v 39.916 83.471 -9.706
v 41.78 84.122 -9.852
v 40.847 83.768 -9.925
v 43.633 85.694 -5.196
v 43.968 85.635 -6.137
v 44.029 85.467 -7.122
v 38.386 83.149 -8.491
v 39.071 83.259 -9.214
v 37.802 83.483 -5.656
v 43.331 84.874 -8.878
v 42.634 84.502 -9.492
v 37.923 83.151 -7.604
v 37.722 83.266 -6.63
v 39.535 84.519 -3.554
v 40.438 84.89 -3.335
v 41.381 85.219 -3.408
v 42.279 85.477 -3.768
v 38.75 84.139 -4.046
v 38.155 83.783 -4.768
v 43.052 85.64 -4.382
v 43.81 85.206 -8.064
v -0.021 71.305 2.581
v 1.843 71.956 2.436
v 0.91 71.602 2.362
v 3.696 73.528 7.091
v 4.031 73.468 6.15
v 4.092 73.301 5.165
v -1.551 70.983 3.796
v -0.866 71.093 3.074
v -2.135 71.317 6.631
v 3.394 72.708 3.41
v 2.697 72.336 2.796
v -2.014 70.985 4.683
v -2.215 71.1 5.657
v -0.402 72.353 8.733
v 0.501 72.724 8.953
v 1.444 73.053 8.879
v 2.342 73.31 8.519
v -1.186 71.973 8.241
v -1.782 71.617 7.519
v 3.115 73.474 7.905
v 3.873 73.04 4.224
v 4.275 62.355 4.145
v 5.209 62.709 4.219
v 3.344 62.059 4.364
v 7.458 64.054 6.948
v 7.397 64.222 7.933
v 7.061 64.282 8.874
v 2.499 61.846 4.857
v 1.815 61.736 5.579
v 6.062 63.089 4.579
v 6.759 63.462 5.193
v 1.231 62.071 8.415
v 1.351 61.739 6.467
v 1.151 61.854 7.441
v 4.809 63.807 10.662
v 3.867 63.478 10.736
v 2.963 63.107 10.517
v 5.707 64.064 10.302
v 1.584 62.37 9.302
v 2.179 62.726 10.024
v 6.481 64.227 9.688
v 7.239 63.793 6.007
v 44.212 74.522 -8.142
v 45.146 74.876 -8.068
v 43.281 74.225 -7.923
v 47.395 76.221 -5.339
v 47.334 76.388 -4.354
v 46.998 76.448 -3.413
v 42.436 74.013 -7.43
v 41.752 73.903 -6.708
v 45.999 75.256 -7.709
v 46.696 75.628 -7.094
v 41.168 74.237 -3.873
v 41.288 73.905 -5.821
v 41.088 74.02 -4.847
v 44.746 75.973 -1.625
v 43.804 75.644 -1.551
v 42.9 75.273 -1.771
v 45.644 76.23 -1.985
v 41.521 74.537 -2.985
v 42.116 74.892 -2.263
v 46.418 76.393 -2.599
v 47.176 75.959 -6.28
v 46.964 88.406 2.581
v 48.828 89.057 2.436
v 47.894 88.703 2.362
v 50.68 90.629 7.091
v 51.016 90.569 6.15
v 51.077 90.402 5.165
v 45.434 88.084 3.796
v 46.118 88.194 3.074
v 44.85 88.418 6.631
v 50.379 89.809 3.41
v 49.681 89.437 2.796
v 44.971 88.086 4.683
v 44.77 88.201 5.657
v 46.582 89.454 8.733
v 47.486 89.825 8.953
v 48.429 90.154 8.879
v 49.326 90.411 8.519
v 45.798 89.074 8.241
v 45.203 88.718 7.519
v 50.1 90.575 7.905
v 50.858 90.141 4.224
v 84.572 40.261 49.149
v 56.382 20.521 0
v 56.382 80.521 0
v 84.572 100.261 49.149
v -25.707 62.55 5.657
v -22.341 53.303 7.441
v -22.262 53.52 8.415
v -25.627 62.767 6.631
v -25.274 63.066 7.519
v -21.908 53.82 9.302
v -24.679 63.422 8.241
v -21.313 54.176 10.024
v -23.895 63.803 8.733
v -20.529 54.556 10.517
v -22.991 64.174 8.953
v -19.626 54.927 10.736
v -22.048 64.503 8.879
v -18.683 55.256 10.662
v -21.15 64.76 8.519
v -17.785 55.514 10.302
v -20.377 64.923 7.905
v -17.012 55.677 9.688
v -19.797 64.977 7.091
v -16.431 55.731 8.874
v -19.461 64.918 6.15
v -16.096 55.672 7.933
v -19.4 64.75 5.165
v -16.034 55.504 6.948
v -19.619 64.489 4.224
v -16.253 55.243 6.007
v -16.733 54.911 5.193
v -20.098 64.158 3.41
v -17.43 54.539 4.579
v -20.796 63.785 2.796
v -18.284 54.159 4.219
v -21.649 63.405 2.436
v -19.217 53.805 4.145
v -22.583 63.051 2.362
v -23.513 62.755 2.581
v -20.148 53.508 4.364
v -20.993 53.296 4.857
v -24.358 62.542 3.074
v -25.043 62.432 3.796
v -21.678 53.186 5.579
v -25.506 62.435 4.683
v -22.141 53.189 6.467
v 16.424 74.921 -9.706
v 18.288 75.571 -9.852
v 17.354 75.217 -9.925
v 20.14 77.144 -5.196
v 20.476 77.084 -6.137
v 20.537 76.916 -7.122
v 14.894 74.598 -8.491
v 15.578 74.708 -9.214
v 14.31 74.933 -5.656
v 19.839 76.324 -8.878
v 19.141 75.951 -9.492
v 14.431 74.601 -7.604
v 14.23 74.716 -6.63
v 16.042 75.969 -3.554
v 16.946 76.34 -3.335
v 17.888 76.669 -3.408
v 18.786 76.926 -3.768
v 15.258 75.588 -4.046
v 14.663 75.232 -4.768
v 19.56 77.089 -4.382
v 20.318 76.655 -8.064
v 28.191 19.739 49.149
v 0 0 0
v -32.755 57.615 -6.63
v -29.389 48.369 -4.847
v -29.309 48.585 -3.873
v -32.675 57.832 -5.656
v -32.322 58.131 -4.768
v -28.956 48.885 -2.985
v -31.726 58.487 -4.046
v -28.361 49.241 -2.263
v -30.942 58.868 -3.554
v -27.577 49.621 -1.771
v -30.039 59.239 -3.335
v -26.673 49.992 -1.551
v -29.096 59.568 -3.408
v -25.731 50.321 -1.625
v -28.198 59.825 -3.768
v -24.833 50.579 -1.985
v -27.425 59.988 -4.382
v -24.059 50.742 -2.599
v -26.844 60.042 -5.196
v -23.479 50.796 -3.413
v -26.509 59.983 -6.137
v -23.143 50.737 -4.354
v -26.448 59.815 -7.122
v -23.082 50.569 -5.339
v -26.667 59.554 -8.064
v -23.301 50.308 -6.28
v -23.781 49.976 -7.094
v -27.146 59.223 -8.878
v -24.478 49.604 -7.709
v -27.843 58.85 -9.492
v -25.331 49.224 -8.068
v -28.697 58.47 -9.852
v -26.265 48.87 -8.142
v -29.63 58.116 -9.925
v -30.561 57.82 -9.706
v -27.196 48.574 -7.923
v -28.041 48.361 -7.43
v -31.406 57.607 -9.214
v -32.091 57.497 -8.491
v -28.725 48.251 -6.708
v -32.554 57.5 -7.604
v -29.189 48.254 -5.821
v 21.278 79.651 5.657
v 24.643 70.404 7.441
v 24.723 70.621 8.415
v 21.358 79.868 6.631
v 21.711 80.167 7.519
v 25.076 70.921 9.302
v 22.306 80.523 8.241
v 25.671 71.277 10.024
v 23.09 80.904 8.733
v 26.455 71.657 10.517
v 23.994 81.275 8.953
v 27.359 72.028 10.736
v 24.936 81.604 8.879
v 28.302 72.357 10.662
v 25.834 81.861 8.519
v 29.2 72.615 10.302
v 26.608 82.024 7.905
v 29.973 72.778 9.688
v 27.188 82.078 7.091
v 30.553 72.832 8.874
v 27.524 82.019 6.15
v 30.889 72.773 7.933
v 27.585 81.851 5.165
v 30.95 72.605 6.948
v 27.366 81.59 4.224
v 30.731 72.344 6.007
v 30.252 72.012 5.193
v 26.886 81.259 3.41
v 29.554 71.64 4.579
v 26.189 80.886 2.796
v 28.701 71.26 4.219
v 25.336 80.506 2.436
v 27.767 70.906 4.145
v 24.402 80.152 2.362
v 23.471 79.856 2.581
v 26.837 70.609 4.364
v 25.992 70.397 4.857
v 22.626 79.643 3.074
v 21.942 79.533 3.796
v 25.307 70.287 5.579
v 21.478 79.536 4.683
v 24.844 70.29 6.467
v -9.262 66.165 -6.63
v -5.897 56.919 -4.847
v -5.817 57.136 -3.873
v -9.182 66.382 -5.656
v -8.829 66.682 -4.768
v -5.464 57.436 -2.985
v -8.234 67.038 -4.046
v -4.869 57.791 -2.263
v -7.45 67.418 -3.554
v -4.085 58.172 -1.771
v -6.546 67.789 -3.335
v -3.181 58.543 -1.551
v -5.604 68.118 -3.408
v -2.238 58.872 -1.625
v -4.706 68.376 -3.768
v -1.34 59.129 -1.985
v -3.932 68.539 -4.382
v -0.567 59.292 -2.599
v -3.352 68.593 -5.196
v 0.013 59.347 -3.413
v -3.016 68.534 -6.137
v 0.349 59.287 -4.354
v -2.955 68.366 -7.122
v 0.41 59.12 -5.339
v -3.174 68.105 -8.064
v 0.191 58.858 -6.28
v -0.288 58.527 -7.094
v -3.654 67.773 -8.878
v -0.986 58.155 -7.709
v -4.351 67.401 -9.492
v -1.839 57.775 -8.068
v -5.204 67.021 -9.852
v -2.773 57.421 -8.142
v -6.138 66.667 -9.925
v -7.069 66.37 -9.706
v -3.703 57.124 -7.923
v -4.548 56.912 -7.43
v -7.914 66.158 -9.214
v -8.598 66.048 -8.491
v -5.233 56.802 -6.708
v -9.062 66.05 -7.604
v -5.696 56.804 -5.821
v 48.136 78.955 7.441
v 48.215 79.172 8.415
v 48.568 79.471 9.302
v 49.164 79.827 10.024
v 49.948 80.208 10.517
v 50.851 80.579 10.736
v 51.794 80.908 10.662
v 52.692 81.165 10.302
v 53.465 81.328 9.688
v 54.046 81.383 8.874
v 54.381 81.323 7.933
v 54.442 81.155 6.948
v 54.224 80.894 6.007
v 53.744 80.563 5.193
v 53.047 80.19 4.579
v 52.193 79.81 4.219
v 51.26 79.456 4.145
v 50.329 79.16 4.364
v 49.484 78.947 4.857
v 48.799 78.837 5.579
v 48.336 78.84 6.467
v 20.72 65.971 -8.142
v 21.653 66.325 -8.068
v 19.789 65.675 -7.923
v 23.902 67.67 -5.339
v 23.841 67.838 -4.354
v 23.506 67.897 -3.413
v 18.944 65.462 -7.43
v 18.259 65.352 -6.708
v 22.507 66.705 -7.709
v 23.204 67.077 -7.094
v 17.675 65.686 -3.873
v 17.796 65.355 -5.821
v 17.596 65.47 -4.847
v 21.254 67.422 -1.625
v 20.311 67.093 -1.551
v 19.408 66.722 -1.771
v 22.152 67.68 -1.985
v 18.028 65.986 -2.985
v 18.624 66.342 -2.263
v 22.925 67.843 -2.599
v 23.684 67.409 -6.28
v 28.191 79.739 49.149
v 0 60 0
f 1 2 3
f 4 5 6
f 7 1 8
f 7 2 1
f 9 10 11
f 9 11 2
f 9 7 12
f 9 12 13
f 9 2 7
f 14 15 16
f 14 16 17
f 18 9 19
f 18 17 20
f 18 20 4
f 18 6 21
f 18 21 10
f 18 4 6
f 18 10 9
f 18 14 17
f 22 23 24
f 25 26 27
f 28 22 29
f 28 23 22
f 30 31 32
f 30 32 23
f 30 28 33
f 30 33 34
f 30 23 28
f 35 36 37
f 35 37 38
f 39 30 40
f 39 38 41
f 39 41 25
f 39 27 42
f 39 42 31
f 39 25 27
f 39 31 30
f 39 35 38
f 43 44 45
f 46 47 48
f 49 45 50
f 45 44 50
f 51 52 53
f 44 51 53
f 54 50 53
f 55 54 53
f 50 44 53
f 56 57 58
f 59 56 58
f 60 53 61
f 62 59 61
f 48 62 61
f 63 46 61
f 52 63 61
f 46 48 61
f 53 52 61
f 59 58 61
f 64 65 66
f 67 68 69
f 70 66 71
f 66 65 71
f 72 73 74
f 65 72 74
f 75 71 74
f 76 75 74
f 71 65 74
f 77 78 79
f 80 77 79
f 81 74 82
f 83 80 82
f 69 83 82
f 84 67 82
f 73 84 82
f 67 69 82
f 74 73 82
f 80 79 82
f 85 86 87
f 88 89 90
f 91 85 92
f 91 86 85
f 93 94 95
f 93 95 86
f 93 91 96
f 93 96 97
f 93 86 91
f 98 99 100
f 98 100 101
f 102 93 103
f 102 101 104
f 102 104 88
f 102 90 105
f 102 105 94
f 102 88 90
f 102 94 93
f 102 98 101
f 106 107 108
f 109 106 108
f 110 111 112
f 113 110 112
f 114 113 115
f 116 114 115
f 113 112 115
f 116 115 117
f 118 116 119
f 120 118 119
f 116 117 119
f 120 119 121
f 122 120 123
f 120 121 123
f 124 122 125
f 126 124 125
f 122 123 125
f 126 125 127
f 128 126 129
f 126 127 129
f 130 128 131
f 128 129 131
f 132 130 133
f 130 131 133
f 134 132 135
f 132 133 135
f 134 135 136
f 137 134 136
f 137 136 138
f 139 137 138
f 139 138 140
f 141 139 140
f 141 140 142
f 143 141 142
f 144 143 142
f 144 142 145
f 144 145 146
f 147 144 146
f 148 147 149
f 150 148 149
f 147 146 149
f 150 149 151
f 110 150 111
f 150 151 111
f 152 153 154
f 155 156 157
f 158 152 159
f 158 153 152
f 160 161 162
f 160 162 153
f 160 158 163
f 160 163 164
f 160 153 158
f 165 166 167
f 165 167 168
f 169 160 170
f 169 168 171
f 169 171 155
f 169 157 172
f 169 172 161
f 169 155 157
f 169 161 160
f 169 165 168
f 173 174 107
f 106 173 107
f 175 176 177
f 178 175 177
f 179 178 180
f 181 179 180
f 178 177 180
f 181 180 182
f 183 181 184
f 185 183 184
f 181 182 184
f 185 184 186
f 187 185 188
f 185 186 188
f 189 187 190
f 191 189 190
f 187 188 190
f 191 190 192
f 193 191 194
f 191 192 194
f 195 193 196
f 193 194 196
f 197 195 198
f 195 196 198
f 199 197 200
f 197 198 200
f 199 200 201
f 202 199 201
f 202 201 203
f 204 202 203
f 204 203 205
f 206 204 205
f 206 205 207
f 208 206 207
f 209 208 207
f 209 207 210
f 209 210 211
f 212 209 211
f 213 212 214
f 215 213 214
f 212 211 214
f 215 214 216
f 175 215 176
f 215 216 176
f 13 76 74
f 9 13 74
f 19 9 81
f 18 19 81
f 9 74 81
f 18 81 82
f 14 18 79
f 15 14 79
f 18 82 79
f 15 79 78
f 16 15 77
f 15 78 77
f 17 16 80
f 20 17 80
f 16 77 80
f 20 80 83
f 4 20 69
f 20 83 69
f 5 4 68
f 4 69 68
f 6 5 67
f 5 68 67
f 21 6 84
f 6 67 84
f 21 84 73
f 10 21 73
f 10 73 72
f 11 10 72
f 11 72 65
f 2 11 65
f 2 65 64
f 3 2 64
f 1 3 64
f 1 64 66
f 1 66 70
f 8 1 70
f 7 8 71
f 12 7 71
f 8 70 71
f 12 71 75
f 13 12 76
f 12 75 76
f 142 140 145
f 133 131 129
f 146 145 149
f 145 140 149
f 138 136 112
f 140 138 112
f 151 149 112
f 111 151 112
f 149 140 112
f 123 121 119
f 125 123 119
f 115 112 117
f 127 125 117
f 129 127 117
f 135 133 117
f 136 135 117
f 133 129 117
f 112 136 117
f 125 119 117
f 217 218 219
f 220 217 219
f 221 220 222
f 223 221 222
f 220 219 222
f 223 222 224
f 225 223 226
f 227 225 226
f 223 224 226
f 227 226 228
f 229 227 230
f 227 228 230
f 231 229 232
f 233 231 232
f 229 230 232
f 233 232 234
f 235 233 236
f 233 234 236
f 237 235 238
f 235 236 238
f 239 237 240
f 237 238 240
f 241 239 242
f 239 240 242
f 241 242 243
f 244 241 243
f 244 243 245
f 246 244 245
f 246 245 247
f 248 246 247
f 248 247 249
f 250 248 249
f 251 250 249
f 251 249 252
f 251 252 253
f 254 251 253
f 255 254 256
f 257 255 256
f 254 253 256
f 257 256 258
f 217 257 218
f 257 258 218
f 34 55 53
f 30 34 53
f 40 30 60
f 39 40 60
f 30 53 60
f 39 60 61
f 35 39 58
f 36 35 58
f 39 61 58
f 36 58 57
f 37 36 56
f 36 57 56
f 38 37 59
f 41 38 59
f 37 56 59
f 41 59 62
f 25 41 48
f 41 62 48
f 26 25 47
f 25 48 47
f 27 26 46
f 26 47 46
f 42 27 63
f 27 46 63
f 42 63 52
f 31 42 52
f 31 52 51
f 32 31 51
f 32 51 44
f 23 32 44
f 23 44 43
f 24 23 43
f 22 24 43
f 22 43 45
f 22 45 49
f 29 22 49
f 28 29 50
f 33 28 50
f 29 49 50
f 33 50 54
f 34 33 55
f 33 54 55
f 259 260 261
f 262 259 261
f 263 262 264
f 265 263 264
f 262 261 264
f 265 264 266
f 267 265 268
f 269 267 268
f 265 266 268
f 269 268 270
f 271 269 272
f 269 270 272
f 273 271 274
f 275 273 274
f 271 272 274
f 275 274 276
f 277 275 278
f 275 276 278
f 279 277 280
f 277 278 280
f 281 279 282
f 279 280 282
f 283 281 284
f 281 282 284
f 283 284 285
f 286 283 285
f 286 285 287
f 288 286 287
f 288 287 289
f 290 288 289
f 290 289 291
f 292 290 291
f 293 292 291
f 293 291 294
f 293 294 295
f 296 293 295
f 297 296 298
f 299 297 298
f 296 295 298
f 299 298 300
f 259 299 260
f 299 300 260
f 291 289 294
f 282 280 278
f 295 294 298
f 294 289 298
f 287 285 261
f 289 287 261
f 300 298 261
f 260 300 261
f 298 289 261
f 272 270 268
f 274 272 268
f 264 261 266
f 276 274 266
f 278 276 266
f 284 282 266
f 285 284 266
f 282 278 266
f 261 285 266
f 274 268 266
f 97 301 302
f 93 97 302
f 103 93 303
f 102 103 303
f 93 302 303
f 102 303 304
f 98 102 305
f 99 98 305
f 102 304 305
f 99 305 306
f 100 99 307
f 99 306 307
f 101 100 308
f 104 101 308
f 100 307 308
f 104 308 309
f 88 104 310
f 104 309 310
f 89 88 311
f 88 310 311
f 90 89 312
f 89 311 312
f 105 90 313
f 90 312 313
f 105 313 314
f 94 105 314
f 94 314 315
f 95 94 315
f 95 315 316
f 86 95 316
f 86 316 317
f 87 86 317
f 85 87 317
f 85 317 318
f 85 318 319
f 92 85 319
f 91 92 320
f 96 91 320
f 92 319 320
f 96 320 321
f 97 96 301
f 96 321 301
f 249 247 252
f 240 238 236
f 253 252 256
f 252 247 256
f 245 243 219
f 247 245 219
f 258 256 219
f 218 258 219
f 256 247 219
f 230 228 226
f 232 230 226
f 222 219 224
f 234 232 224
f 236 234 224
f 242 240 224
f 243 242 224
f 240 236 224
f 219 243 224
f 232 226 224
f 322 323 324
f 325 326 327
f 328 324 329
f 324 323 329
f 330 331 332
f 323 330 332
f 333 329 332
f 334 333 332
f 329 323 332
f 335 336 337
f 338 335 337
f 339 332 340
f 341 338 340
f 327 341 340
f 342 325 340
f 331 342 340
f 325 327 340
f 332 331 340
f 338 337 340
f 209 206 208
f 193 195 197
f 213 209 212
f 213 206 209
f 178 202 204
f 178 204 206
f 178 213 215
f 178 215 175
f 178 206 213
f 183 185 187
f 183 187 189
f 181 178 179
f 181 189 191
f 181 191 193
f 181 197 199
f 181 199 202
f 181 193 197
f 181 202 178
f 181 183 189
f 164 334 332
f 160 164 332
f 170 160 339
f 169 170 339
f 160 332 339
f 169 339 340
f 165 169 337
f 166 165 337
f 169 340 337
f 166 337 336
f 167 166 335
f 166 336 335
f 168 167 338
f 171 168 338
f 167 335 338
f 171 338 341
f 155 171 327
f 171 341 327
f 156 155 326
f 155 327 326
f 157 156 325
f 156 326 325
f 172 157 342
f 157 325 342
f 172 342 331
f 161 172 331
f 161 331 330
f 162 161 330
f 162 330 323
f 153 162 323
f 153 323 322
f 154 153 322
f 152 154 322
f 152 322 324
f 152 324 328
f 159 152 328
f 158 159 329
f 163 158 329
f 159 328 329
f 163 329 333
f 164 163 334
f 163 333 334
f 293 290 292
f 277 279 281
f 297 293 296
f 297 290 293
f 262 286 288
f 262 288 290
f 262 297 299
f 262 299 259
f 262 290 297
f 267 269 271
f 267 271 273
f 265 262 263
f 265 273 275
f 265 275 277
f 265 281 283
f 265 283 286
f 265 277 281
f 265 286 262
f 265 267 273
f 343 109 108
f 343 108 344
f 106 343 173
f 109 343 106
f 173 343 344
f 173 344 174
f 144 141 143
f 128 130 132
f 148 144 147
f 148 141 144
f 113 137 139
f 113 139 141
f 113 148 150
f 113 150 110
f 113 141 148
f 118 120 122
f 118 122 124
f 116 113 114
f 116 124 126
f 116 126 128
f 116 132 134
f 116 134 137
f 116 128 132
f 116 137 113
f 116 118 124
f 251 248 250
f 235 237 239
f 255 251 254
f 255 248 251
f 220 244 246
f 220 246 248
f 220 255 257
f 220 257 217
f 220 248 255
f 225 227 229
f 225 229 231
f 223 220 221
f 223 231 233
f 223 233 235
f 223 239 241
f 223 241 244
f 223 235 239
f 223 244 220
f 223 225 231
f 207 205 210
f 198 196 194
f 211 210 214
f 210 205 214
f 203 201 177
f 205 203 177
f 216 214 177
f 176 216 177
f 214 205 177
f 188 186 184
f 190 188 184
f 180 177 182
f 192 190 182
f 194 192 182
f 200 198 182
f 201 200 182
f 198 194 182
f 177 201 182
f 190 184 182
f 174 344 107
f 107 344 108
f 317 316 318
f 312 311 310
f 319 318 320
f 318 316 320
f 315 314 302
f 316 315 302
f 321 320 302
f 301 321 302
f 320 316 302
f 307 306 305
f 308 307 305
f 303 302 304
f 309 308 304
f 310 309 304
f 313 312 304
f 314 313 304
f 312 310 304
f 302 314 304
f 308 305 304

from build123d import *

# Parameters (mm, degrees)
SKIZZE1_R                       = 3.358360703
AUFSATZ_LINEAR_AUSTRAGEN1_DEPTH = 10
LINEARES_MUSTER2_COUNT          = 4
LINEARES_MUSTER2_PITCH          = 25
LINEARES_MUSTER2_COUNT_DIR2     = 2
LINEARES_MUSTER2_PITCH_DIR2     = 15


with BuildPart() as part:
    # Austragung1: sweep along a path in SK Pfad
    with BuildLine(Plane(origin=(0, 0, 0), x_dir=(0, 0, 1), z_dir=(-0.573576436, 0.819152044, 0))) as austragung1_path:
        Line((0, 0), (49.149122657, 34.414586181))
    # SK Grundriss → Austragung1 (sweep)
    with BuildSketch(Plane.XY):
        Polygon((0, 0), (0, 60), (56.381557247, 80.5212086), (56.381557247, 20.5212086), align=None)
    sweep(path=austragung1_path.line)


with BuildPart() as body_2:
    # Skizze1 → Aufsatz-Linear austragen1 (new body)
    with BuildSketch(Plane(origin=(-18.670430807, 51.296587053, -9.892946648), x_dir=(0.941669784, 0.330449009, -0.063729667), z_dir=(-0.336538286, 0.924631341, -0.178322361))):
        with Locations(Location((74.295440009, -22.475001385, 0), (0, 0, 176.286481511))):  # turned: the seam where the file's is
            Circle(SKIZZE1_R)
    aufsatz_linear_austragen1 = extrude(amount=AUFSATZ_LINEAR_AUSTRAGEN1_DEPTH)


with BuildPart() as lineares_muster2_1:
    # Lineares Muster2: Aufsatz-Linear austragen1 4 × 2
    with Locations(*[Vector(-0.939692621, -0.342020143, 0) * (i * LINEARES_MUSTER2_PITCH) + Vector(-0.46984631, -0.328989928, -0.819152044) * (j * LINEARES_MUSTER2_PITCH_DIR2) for i in range(LINEARES_MUSTER2_COUNT) for j in range(LINEARES_MUSTER2_COUNT_DIR2) if (i, j) != (0, 0)]):
        add(aufsatz_linear_austragen1)


solid = Compound([part.part, body_2.part, lineares_muster2_1.part])
